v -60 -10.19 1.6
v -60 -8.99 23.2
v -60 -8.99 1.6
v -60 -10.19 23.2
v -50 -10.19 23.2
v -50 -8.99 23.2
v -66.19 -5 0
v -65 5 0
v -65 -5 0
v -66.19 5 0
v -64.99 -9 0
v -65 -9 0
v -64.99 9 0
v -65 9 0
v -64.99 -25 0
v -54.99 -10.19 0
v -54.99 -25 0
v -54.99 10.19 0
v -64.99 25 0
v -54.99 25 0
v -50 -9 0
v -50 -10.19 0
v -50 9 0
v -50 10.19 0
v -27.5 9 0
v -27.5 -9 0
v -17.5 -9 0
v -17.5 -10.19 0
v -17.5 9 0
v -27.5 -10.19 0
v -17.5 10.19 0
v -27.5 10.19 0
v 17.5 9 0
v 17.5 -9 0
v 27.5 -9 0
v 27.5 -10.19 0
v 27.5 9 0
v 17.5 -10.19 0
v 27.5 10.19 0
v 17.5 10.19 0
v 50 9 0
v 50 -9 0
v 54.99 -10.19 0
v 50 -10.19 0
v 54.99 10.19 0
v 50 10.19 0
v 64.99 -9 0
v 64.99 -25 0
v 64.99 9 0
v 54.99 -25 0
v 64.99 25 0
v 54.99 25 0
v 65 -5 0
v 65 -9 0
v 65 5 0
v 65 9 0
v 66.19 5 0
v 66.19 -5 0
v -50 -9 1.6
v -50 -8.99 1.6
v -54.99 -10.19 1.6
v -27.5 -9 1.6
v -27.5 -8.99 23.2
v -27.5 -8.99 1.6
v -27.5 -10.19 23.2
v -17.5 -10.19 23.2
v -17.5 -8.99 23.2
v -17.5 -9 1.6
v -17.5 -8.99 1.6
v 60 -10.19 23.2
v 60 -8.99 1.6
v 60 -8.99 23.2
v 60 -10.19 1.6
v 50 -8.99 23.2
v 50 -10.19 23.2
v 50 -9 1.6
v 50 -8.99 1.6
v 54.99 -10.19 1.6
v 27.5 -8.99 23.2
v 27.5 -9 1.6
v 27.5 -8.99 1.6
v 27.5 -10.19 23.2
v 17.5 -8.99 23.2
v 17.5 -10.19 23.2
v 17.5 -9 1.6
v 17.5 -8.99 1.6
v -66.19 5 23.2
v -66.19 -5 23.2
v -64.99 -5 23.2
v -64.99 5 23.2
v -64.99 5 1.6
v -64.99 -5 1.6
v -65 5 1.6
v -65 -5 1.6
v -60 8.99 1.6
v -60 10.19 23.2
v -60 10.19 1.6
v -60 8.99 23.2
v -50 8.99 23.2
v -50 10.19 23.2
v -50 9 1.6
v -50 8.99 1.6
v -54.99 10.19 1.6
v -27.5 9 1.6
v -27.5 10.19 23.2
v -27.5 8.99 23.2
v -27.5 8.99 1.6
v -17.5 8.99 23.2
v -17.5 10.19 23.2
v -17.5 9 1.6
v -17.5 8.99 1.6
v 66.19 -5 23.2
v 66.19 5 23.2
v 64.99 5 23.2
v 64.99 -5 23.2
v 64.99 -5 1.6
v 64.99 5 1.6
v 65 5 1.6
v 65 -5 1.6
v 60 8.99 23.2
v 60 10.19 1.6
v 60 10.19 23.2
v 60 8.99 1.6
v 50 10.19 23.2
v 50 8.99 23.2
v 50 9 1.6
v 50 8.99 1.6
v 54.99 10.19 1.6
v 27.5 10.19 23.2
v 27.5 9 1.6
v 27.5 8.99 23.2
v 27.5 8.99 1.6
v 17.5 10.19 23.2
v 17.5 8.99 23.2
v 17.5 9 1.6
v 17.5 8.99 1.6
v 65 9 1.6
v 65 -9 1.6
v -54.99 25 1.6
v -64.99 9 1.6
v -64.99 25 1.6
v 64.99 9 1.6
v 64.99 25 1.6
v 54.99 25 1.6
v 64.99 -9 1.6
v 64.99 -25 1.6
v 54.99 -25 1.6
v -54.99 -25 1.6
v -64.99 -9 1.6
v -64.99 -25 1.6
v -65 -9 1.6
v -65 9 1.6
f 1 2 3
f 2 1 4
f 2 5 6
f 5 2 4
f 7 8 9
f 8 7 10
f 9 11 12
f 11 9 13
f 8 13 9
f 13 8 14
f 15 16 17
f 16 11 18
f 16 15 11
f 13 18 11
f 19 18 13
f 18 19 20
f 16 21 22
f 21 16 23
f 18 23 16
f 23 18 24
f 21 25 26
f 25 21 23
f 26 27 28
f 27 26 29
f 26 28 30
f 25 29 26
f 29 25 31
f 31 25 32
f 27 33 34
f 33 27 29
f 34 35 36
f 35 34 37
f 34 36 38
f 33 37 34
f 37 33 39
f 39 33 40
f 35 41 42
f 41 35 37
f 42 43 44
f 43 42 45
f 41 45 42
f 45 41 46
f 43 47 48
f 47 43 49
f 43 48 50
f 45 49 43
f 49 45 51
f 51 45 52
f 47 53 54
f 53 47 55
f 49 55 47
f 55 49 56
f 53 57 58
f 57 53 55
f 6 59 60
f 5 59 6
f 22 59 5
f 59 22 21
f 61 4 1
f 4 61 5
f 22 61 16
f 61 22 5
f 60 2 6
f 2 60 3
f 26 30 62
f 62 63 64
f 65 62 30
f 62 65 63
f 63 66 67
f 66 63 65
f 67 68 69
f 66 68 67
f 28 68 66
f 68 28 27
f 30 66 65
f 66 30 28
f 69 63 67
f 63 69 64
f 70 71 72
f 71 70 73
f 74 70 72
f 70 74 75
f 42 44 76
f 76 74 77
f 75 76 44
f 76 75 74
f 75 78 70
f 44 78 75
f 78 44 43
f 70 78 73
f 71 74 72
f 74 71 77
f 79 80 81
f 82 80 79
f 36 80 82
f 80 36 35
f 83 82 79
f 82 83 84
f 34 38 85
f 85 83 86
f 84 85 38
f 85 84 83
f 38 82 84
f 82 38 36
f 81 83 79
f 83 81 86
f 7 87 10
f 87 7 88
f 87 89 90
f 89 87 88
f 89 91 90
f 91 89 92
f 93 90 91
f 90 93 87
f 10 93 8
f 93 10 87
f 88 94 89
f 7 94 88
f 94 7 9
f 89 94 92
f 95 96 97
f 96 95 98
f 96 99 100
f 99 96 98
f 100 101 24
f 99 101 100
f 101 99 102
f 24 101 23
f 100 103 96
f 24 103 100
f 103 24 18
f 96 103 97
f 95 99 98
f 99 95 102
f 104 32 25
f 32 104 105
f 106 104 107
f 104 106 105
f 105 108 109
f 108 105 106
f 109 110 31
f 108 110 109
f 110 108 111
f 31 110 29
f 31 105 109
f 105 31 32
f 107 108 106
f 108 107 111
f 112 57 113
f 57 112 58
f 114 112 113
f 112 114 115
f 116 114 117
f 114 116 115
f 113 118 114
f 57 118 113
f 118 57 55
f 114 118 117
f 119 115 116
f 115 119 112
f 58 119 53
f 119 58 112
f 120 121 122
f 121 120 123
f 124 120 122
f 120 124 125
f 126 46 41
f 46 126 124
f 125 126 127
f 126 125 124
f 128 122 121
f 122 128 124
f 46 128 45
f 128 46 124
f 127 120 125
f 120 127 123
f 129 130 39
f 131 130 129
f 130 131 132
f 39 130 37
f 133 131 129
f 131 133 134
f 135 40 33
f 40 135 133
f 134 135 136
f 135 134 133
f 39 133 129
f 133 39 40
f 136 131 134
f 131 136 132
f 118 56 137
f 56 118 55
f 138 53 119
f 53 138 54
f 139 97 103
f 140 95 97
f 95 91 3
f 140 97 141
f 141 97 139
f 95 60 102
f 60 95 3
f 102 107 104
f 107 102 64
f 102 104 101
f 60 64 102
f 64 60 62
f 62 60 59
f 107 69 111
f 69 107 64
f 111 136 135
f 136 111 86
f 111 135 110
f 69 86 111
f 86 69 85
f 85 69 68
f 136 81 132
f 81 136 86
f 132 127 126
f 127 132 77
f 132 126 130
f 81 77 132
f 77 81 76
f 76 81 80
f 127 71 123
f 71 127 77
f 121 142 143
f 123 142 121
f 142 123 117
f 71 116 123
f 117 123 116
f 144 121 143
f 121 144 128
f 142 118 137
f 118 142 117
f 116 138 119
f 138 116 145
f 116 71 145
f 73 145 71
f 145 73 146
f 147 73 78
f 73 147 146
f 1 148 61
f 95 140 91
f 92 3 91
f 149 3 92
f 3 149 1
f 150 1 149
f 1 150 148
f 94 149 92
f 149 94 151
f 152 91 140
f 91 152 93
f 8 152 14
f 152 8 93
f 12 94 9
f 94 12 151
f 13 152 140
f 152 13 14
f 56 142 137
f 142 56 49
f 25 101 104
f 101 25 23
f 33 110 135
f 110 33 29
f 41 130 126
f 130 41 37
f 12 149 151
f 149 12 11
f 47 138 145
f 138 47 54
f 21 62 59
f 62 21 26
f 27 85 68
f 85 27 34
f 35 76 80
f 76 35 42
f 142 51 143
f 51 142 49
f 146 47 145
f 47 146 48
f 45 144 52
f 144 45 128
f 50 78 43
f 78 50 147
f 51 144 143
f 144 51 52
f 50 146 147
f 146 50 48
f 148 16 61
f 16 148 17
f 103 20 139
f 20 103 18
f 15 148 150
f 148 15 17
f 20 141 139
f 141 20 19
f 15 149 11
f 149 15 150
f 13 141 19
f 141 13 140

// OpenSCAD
// -*- mode: SCAD ; c-file-style: "ellemtel" ; coding: utf-8 -*-
//
// correctly sized simple shape to stack four picture 135 type film strips
//
// (c) 2018 Roland Sieker <ospalh@gmail.com>
// Licence: CC-BY-SA 4.0


// ... to preview. You will get all parts when you click "Create Thing".
part = "stack"; // [stack: Stapler, lid: Deckel]

// Set this to "render" and click on "Create Thing" when done with the setup.
preview = 1; // [0:render, 1:preview]
// not needed

ex = 3;
ey = 2;
lld = 127;  // Pitch scheint 1 Zoll zu sein, -> Fuenf Bilder ergibt fuenf Zoll.
ll = lld + ex;

wld = 16; // Make it fit between the plates without problems
wst = wld + ey; // 35 mm + clearance
h = 20; // I have a lot of film strips i want to stack
epl = 10;

w = 1.2;  // Wall width

spl = 10;
spo = 5;
spsp = ll/4;

hl = 50;
hw = 10;

/* [Hidden] */

// Done with the customizer

// *******************************************************
// Extra parameters. These can be changed reasonably safely.



p = 1.6;  // Bottom, top plate height
c = 0.4;  // Clearance
angle = 60; // Overhangs much below 60 degrees are a problem for me

// *******************************************************
// Some shortcuts. These shouldn't be changed

tau = 2 * PI;  // pi is still wrong. tau = circumference / r

xy_factor = 1/tan(angle);
// To get from a height to a horizontal width inclined correctly
z_factor = tan(angle);  // The other way around

he = h + 2*p;
spo2 = ll/2 - spo - spl;

some_distance = 50;
ms = 0.01;  // Muggeseggele.

// fn for differently sized objects and fs, fa; all for preview or rendering.
pna = 40;
pnb = 15;
pa = 5;
ps = 1;
rna = 180;
rnb = 30;
ra = 1;
rs = 0.1;
function na() = (preview) ? pna : rna;
function nb() = (preview) ? pnb : rnb;
$fs = (preview) ? ps : rs;
$fa = (preview) ? pa : ra;

// *******************************************************
// End setup



// *******************************************************
// Generate the parts

print_part();
// preview_parts();
// stack_parts();



module print_part()
{
   if ("stack" == part)
   {
      stack();
   }
   if ("lid" == part)
   {
      lid();
   }
}

module preview_parts()
{
   stack();
   translate([0, some_distance, 0])
   {
      lid();
   }
}

module stack_parts()
{
   // intersection()
   {
      color("yellow")
      {
         stack();
      }
      translate([0,0, 3*p])
      {
         color("red")
         {
            lid();
         }
      }
   }
}

// *******************************************************
// Code for the parts themselves

module stack()
{
   translate([0,0,p/2])
   {
      cube([ll, wst, p], center=true);
   }
   plates();
   h_cube();
   mirror()
   {
      h_cube();
   }
   module h_cube()
   {
      translate([ll/2-ms-hw/2, 0, p/2])
      {
         cube([hw, hl, p], center=true);
      }

   }
}


module lid()
{
   translate([0,0,p/2])
   {
      cube([lld, wld, p], center=true);
   }
}


module plates()
{
   end_plate();
   side_plate(0);
   side_plate(spsp);
   // side_plate(2*spsp);
   rotate(180)
   {
      side_plate(0);
      side_plate(spsp);
      // side_plate(2*spsp);
   }
   mirror()
   {
      end_plate();
      side_plate(0);
      side_plate(spsp);
      // side_plate(2*spsp);
      rotate(180)
      {
         side_plate(0);
         side_plate(spsp);
         // side_plate(2*spsp);
      }
   }
}

module end_plate()
{
   translate([ll/2-ms , -epl/2,0])
   {
      cube([w, epl, he]);
   }
}

module side_plate(xo)
{
   translate([spo2-xo, wst/2-ms,0])
   {
      cube([spl, w, he]);
   }
}
